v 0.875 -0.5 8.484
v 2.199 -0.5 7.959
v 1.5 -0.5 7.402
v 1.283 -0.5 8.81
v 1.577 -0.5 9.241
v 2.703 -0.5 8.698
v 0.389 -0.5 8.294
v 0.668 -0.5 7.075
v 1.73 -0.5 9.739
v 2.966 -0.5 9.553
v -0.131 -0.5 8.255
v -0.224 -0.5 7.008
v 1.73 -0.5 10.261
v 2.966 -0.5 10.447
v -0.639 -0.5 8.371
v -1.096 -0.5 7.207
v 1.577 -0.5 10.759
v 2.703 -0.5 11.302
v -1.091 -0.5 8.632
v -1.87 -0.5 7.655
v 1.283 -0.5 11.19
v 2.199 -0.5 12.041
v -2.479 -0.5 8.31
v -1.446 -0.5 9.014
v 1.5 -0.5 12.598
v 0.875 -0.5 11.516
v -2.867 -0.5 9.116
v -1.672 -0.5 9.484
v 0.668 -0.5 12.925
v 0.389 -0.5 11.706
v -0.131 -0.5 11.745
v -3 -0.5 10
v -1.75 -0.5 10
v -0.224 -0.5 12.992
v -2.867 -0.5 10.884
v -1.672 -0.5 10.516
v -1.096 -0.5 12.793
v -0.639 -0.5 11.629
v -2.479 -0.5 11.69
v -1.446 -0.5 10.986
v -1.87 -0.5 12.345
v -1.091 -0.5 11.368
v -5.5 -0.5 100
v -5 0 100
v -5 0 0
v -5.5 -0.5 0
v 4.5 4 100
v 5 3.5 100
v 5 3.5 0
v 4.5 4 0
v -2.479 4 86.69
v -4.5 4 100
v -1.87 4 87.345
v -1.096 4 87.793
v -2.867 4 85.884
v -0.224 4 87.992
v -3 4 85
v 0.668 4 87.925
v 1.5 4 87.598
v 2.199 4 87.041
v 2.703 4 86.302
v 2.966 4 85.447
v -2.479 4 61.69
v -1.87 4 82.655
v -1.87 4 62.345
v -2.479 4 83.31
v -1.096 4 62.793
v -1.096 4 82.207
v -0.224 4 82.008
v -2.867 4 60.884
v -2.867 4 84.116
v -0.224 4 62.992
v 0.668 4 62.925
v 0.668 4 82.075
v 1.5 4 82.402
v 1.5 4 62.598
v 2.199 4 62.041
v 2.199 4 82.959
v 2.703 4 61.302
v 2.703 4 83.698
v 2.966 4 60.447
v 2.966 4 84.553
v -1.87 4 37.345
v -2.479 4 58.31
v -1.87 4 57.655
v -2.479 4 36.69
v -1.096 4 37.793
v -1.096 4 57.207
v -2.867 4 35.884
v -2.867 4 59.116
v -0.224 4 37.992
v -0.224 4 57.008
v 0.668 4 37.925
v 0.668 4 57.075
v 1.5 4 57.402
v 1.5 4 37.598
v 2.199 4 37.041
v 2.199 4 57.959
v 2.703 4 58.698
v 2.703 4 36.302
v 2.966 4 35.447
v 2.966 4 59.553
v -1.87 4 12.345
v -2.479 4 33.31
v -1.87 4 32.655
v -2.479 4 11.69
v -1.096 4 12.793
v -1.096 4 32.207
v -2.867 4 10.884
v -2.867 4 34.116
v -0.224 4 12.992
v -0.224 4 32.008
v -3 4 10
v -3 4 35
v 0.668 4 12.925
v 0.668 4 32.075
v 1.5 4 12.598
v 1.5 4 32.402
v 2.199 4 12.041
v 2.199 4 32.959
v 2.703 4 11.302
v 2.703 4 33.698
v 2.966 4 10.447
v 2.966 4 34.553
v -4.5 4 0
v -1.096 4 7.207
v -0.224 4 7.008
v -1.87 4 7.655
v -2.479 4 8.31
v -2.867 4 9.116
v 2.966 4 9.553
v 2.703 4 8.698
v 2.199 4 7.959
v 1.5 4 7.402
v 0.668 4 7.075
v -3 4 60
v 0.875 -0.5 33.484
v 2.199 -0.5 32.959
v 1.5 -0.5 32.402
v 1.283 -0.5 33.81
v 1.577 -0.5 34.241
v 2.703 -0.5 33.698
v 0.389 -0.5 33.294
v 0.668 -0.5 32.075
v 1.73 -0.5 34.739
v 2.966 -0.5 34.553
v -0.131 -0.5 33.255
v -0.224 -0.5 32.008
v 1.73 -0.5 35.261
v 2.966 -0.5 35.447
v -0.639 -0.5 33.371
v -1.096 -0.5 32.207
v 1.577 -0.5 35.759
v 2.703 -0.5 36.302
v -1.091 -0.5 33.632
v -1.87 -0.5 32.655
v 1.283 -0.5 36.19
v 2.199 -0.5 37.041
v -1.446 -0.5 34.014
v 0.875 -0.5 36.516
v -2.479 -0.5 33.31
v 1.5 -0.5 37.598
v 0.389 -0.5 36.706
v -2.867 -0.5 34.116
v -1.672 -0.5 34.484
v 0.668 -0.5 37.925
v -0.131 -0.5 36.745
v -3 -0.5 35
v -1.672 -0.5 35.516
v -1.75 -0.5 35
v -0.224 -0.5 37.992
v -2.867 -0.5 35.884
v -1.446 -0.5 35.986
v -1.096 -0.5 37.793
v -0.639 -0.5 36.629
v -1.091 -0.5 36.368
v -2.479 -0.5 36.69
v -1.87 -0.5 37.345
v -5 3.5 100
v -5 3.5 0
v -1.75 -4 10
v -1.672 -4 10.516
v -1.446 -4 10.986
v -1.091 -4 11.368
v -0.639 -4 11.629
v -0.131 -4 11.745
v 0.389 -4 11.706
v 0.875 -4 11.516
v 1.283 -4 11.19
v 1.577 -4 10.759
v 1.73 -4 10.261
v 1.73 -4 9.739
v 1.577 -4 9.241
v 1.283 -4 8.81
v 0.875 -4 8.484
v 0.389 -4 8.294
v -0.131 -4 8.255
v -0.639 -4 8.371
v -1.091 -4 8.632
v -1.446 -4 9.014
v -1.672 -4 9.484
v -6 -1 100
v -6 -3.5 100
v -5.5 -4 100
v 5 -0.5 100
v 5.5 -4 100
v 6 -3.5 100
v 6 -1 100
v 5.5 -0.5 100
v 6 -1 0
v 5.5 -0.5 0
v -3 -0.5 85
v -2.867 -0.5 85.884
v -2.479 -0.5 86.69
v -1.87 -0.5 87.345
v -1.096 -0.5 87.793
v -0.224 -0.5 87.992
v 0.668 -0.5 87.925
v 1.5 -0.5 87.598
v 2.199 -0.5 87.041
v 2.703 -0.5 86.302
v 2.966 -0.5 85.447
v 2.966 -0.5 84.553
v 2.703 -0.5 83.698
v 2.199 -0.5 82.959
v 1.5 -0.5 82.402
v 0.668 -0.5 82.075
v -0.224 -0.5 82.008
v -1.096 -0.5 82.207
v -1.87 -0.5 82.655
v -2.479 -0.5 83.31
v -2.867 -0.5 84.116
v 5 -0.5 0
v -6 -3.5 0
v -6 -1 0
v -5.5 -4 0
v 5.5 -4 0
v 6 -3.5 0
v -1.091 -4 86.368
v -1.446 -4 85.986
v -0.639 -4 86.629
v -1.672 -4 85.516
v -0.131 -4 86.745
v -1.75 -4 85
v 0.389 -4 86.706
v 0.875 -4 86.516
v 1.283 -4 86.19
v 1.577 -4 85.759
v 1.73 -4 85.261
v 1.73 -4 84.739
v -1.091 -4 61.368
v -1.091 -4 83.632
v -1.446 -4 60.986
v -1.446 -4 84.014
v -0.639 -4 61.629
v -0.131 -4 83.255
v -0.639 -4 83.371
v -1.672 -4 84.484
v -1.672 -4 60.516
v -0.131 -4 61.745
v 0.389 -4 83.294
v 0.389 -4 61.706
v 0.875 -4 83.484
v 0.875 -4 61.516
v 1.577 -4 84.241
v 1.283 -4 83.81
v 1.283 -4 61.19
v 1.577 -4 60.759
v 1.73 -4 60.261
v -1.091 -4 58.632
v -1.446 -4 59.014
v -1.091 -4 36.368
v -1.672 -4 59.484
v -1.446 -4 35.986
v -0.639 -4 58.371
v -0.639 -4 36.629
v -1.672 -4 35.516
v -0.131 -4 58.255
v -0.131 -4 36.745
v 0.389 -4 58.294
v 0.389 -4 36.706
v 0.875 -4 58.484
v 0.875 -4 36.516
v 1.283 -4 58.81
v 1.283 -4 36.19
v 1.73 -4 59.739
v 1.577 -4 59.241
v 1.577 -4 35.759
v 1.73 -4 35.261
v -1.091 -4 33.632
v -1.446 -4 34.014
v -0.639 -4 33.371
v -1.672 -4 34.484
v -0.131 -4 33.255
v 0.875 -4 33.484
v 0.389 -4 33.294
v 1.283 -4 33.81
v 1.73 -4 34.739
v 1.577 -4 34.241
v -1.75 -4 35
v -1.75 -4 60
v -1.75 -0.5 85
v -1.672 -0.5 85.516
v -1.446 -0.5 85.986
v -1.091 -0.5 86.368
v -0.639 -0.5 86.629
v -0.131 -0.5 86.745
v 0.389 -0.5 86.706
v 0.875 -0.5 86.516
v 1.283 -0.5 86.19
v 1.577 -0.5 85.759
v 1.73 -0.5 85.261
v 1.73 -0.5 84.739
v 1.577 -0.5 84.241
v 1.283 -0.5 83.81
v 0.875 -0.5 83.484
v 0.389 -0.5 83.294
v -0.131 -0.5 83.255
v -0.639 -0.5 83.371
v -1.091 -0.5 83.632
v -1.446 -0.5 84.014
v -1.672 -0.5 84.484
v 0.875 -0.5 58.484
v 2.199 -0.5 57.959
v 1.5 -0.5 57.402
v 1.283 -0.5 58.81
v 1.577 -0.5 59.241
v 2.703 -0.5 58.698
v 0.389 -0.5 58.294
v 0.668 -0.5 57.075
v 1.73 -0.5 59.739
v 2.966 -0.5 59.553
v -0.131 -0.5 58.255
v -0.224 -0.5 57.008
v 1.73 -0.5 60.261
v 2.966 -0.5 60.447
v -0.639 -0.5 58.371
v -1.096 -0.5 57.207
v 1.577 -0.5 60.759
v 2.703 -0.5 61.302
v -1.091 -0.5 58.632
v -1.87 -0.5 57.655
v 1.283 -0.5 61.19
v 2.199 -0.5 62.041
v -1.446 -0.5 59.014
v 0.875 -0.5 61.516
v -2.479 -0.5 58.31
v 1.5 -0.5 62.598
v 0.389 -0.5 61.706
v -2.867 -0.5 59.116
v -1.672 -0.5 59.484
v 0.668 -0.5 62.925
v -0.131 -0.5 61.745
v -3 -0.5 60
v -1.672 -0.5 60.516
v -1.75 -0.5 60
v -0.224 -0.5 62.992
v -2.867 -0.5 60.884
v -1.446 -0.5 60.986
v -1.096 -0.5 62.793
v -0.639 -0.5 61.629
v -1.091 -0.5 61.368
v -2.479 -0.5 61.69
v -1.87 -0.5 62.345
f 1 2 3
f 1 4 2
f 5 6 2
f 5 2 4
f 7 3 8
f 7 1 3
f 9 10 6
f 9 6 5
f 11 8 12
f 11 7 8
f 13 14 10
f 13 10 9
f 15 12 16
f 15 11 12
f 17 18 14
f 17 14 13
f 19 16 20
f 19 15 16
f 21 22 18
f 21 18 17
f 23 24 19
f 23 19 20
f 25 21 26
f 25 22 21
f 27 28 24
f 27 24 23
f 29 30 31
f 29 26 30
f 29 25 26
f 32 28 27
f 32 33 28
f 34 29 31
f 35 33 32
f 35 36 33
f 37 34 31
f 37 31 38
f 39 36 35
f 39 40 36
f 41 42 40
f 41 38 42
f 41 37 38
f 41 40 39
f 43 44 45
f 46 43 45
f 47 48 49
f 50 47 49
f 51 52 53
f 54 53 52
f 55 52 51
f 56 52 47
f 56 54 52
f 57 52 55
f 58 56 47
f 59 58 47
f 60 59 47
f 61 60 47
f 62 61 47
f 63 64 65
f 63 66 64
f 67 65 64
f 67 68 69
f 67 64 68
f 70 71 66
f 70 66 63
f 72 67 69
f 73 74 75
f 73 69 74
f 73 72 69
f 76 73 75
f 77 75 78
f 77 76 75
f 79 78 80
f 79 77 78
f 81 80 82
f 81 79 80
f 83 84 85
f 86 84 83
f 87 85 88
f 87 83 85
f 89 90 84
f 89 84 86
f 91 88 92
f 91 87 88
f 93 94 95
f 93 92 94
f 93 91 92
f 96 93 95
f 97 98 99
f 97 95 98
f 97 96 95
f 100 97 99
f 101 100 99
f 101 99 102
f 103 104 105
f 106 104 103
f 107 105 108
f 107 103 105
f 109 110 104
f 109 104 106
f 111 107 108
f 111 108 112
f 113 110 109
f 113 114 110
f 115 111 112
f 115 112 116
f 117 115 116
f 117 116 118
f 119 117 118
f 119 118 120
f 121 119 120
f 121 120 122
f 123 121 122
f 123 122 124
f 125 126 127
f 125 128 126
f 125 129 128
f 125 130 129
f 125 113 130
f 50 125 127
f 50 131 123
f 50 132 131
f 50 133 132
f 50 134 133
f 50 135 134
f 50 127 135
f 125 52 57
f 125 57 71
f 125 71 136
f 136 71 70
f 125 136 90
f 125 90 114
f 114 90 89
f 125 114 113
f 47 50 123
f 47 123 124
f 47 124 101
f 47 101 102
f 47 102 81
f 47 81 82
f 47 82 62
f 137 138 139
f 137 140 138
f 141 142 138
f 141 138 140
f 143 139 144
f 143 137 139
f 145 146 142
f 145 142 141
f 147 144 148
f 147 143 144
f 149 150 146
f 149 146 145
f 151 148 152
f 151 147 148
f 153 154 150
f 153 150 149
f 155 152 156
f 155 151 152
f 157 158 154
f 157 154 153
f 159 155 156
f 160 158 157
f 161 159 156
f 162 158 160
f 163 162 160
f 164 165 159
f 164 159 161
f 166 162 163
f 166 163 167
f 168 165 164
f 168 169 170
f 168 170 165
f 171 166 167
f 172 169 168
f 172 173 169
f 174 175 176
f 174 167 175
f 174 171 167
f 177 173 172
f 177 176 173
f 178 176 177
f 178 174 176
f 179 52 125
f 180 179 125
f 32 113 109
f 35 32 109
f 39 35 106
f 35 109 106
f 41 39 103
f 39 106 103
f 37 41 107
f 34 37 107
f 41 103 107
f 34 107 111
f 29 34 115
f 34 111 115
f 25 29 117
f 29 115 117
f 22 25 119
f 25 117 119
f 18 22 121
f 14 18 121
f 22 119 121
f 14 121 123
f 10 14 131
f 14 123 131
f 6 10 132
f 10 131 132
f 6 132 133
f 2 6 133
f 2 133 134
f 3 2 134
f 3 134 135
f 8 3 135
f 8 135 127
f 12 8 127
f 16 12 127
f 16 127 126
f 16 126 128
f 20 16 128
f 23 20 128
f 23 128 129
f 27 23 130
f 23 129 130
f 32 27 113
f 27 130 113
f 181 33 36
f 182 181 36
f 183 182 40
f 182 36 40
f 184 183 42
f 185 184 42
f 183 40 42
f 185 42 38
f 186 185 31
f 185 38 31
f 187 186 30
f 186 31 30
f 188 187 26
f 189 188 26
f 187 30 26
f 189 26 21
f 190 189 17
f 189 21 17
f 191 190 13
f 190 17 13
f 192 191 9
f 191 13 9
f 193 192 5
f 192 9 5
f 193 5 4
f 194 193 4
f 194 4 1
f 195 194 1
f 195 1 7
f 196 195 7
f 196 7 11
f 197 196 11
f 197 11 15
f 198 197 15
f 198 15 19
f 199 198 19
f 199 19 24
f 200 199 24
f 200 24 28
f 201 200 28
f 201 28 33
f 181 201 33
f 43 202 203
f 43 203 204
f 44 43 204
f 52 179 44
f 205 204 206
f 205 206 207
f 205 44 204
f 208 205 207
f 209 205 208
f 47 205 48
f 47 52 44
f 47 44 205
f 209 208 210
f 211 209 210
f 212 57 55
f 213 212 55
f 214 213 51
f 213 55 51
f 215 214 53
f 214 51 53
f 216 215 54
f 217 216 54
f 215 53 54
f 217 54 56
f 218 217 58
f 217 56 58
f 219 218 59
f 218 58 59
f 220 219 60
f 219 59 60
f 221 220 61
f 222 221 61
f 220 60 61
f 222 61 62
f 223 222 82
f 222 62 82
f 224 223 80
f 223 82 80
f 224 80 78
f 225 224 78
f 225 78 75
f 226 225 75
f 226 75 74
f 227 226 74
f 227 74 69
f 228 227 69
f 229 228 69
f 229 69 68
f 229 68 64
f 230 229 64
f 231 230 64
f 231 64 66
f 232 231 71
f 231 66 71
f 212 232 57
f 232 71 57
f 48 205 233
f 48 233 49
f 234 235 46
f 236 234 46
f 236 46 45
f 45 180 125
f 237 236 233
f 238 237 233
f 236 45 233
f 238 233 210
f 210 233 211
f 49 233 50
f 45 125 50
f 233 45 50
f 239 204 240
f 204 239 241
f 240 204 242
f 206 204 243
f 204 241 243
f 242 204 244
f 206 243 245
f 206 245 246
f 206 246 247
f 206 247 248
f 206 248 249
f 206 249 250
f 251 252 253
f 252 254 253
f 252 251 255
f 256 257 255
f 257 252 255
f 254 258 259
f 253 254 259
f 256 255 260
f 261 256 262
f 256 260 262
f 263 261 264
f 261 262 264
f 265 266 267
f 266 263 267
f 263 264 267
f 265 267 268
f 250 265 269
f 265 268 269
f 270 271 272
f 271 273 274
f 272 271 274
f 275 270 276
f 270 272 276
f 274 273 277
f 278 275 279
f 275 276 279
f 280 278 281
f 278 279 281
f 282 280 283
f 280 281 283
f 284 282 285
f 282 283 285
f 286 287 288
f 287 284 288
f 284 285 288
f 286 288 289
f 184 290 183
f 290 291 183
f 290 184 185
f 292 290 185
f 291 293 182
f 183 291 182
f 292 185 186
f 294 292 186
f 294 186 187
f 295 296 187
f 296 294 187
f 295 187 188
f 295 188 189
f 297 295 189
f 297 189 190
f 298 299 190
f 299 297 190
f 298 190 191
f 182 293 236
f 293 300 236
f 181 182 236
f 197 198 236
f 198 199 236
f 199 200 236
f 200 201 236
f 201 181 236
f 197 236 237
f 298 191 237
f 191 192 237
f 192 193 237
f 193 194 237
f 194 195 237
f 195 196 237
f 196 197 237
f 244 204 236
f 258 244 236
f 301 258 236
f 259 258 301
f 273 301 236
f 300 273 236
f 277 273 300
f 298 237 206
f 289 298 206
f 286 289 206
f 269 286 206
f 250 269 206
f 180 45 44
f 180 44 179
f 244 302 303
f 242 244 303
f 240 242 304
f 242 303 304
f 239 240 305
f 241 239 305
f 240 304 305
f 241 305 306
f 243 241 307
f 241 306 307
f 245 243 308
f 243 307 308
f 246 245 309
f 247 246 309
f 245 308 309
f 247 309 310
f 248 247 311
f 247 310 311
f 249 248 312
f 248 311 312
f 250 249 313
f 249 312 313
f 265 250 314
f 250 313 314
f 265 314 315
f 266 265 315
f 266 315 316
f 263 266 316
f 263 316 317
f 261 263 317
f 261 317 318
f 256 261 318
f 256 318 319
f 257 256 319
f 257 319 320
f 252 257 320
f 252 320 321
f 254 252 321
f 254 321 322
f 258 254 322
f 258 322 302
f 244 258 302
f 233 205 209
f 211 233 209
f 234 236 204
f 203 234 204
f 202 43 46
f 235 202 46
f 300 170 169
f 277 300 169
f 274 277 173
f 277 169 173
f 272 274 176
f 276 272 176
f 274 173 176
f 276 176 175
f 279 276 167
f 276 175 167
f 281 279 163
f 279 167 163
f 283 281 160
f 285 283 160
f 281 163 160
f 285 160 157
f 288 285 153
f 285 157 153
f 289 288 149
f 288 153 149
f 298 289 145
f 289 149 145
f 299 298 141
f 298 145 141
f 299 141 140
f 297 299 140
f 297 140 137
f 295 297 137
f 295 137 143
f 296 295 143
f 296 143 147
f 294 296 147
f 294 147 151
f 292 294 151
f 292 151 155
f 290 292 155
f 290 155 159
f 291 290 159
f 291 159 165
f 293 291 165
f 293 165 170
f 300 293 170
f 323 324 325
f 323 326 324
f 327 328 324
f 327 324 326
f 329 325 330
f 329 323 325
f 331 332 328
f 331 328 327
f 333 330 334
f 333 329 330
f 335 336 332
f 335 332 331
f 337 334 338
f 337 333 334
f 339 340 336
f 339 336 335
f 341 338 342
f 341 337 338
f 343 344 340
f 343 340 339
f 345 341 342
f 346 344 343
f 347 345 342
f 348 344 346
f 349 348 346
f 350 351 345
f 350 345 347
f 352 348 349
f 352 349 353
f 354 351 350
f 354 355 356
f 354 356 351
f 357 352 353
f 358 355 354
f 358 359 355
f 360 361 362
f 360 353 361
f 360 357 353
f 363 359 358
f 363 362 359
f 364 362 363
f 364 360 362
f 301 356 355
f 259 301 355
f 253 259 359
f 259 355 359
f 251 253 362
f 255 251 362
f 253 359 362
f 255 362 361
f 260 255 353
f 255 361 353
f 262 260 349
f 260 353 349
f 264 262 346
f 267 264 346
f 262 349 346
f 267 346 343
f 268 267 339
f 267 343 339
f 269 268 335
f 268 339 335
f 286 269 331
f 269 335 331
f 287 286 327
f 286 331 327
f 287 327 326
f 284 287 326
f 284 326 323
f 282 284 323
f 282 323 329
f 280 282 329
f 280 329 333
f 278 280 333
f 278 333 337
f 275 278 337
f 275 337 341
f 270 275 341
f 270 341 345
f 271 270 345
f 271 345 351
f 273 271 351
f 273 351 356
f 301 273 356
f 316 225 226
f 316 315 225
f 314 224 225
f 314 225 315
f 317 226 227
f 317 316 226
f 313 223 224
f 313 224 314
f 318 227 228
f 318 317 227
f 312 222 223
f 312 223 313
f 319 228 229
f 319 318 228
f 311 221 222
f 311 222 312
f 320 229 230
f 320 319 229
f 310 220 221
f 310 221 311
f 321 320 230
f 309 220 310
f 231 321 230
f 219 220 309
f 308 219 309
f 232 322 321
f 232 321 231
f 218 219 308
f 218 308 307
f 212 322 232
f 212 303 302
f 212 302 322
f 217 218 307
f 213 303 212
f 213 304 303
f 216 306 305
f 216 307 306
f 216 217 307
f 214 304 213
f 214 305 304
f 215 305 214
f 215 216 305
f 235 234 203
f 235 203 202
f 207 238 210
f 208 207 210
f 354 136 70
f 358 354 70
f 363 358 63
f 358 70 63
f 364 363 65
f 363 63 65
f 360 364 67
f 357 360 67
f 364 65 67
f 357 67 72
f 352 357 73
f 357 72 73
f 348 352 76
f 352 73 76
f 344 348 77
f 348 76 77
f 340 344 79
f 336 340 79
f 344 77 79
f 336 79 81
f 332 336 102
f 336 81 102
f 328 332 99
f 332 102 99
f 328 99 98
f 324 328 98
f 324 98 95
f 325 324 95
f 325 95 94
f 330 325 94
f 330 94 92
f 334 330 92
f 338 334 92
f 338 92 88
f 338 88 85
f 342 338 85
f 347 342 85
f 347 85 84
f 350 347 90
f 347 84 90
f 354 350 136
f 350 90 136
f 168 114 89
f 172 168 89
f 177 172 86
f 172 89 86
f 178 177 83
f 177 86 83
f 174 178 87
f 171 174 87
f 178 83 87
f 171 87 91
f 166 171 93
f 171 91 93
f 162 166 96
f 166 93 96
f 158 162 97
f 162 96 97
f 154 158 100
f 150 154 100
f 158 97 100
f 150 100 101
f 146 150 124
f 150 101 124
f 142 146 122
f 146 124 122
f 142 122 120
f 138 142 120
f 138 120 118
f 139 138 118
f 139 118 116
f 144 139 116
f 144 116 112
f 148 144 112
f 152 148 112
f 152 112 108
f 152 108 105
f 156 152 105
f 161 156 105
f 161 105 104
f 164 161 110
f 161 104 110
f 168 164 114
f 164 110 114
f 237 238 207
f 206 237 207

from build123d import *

# Parameters (mm, degrees)
SKETCH_1_W          = 12
SKETCH_1_H          = 8
EXTRUDE_1_DEPTH     = 100
SKETCH_2_W          = 1
SKETCH_2_H          = 4.5
CUT_EXTRUDE_1_DEPTH = 400
CHAMFER_1_SIZE      = 0.5
SKETCH_3_R          = 1.75
CUT_EXTRUDE_2_DEPTH = 400
SKETCH_4_R          = 3
CUT_EXTRUDE_3_DEPTH = 4.5


with BuildPart() as part:
    # 草图1 → 凸台-拉伸1 (new body)
    with BuildSketch(Plane.XY):
        Rectangle(SKETCH_1_W, SKETCH_1_H)
    extrude(amount=EXTRUDE_1_DEPTH)

    # 草图2 → 切除-拉伸1 (cut)
    with BuildSketch(Plane.XY.offset(100)):
        with Locations((-5.5, 1.75)):
            Rectangle(SKETCH_2_W, SKETCH_2_H)
        with Locations((5.5, 1.75)):
            Rectangle(SKETCH_2_W, SKETCH_2_H)
    extrude(amount=-CUT_EXTRUDE_1_DEPTH, mode=Mode.SUBTRACT)

    # 倒角1
    chamfer_1_edges = [part.edges().sort_by_distance(p)[0] for p in [
        (-5, 4, 50),
        (-5, -0.5, 50),
        (-6, -0.5, 50),
        (6, -0.5, 50),
        (5, 4, 50),
        (6, -4, 50),
        (-6, -4, 50),
    ]]
    chamfer(chamfer_1_edges, length=CHAMFER_1_SIZE - 0.0001)  # a hair under: the kernel refuses the full size

    # 草图3 → 切除-拉伸2 (cut)
    with BuildSketch(Plane(origin=(0, 4, 0), x_dir=(1, 0, 0), z_dir=(0, 1, 0))):
        with Locations(Location((0, -10, 0), (0, 0, 180))):
            Circle(SKETCH_3_R)
        with Locations(Location((0, -35, 0), (0, 0, 180))):
            Circle(SKETCH_3_R)
        with Locations(Location((0, -60, 0), (0, 0, 180))):
            Circle(SKETCH_3_R)
        with Locations(Location((0, -85, 0), (0, 0, 180))):
            Circle(SKETCH_3_R)
        with Locations((0, -110)):
            Circle(SKETCH_3_R)
        with Locations((0, -135)):
            Circle(SKETCH_3_R)
        with Locations((0, -160)):
            Circle(SKETCH_3_R)
        with Locations((0, -185)):
            Circle(SKETCH_3_R)
        with Locations((0, -210)):
            Circle(SKETCH_3_R)
        with Locations((0, -235)):
            Circle(SKETCH_3_R)
        with Locations((0, -260)):
            Circle(SKETCH_3_R)
        with Locations((0, -285)):
            Circle(SKETCH_3_R)
        with Locations((0, -310)):
            Circle(SKETCH_3_R)
        with Locations((0, -335)):
            Circle(SKETCH_3_R)
        with Locations((0, -360)):
            Circle(SKETCH_3_R)
        with Locations((0, -385)):
            Circle(SKETCH_3_R)
    extrude(amount=-CUT_EXTRUDE_2_DEPTH, mode=Mode.SUBTRACT)

    # 草图4 → 切除-拉伸3 (cut)
    with BuildSketch(Plane(origin=(0, 4, 0), x_dir=(1, 0, 0), z_dir=(0, 1, 0))):
        with Locations(Location((0, -10, 0), (0, 0, 180))):
            Circle(SKETCH_4_R)
        with Locations(Location((0, -35, 0), (0, 0, 180))):
            Circle(SKETCH_4_R)
        with Locations(Location((0, -60, 0), (0, 0, 180))):
            Circle(SKETCH_4_R)
        with Locations(Location((0, -85, 0), (0, 0, 180))):
            Circle(SKETCH_4_R)
        with Locations((0, -110)):
            Circle(SKETCH_4_R)
        with Locations((0, -135)):
            Circle(SKETCH_4_R)
        with Locations((0, -160)):
            Circle(SKETCH_4_R)
        with Locations((0, -185)):
            Circle(SKETCH_4_R)
        with Locations((0, -210)):
            Circle(SKETCH_4_R)
        with Locations((0, -235)):
            Circle(SKETCH_4_R)
        with Locations((0, -260)):
            Circle(SKETCH_4_R)
        with Locations((0, -285)):
            Circle(SKETCH_4_R)
        with Locations((0, -310)):
            Circle(SKETCH_4_R)
        with Locations((0, -335)):
            Circle(SKETCH_4_R)
        with Locations((0, -360)):
            Circle(SKETCH_4_R)
        with Locations((0, -385)):
            Circle(SKETCH_4_R)
    extrude(amount=-CUT_EXTRUDE_3_DEPTH, mode=Mode.SUBTRACT)


solid = part.part
